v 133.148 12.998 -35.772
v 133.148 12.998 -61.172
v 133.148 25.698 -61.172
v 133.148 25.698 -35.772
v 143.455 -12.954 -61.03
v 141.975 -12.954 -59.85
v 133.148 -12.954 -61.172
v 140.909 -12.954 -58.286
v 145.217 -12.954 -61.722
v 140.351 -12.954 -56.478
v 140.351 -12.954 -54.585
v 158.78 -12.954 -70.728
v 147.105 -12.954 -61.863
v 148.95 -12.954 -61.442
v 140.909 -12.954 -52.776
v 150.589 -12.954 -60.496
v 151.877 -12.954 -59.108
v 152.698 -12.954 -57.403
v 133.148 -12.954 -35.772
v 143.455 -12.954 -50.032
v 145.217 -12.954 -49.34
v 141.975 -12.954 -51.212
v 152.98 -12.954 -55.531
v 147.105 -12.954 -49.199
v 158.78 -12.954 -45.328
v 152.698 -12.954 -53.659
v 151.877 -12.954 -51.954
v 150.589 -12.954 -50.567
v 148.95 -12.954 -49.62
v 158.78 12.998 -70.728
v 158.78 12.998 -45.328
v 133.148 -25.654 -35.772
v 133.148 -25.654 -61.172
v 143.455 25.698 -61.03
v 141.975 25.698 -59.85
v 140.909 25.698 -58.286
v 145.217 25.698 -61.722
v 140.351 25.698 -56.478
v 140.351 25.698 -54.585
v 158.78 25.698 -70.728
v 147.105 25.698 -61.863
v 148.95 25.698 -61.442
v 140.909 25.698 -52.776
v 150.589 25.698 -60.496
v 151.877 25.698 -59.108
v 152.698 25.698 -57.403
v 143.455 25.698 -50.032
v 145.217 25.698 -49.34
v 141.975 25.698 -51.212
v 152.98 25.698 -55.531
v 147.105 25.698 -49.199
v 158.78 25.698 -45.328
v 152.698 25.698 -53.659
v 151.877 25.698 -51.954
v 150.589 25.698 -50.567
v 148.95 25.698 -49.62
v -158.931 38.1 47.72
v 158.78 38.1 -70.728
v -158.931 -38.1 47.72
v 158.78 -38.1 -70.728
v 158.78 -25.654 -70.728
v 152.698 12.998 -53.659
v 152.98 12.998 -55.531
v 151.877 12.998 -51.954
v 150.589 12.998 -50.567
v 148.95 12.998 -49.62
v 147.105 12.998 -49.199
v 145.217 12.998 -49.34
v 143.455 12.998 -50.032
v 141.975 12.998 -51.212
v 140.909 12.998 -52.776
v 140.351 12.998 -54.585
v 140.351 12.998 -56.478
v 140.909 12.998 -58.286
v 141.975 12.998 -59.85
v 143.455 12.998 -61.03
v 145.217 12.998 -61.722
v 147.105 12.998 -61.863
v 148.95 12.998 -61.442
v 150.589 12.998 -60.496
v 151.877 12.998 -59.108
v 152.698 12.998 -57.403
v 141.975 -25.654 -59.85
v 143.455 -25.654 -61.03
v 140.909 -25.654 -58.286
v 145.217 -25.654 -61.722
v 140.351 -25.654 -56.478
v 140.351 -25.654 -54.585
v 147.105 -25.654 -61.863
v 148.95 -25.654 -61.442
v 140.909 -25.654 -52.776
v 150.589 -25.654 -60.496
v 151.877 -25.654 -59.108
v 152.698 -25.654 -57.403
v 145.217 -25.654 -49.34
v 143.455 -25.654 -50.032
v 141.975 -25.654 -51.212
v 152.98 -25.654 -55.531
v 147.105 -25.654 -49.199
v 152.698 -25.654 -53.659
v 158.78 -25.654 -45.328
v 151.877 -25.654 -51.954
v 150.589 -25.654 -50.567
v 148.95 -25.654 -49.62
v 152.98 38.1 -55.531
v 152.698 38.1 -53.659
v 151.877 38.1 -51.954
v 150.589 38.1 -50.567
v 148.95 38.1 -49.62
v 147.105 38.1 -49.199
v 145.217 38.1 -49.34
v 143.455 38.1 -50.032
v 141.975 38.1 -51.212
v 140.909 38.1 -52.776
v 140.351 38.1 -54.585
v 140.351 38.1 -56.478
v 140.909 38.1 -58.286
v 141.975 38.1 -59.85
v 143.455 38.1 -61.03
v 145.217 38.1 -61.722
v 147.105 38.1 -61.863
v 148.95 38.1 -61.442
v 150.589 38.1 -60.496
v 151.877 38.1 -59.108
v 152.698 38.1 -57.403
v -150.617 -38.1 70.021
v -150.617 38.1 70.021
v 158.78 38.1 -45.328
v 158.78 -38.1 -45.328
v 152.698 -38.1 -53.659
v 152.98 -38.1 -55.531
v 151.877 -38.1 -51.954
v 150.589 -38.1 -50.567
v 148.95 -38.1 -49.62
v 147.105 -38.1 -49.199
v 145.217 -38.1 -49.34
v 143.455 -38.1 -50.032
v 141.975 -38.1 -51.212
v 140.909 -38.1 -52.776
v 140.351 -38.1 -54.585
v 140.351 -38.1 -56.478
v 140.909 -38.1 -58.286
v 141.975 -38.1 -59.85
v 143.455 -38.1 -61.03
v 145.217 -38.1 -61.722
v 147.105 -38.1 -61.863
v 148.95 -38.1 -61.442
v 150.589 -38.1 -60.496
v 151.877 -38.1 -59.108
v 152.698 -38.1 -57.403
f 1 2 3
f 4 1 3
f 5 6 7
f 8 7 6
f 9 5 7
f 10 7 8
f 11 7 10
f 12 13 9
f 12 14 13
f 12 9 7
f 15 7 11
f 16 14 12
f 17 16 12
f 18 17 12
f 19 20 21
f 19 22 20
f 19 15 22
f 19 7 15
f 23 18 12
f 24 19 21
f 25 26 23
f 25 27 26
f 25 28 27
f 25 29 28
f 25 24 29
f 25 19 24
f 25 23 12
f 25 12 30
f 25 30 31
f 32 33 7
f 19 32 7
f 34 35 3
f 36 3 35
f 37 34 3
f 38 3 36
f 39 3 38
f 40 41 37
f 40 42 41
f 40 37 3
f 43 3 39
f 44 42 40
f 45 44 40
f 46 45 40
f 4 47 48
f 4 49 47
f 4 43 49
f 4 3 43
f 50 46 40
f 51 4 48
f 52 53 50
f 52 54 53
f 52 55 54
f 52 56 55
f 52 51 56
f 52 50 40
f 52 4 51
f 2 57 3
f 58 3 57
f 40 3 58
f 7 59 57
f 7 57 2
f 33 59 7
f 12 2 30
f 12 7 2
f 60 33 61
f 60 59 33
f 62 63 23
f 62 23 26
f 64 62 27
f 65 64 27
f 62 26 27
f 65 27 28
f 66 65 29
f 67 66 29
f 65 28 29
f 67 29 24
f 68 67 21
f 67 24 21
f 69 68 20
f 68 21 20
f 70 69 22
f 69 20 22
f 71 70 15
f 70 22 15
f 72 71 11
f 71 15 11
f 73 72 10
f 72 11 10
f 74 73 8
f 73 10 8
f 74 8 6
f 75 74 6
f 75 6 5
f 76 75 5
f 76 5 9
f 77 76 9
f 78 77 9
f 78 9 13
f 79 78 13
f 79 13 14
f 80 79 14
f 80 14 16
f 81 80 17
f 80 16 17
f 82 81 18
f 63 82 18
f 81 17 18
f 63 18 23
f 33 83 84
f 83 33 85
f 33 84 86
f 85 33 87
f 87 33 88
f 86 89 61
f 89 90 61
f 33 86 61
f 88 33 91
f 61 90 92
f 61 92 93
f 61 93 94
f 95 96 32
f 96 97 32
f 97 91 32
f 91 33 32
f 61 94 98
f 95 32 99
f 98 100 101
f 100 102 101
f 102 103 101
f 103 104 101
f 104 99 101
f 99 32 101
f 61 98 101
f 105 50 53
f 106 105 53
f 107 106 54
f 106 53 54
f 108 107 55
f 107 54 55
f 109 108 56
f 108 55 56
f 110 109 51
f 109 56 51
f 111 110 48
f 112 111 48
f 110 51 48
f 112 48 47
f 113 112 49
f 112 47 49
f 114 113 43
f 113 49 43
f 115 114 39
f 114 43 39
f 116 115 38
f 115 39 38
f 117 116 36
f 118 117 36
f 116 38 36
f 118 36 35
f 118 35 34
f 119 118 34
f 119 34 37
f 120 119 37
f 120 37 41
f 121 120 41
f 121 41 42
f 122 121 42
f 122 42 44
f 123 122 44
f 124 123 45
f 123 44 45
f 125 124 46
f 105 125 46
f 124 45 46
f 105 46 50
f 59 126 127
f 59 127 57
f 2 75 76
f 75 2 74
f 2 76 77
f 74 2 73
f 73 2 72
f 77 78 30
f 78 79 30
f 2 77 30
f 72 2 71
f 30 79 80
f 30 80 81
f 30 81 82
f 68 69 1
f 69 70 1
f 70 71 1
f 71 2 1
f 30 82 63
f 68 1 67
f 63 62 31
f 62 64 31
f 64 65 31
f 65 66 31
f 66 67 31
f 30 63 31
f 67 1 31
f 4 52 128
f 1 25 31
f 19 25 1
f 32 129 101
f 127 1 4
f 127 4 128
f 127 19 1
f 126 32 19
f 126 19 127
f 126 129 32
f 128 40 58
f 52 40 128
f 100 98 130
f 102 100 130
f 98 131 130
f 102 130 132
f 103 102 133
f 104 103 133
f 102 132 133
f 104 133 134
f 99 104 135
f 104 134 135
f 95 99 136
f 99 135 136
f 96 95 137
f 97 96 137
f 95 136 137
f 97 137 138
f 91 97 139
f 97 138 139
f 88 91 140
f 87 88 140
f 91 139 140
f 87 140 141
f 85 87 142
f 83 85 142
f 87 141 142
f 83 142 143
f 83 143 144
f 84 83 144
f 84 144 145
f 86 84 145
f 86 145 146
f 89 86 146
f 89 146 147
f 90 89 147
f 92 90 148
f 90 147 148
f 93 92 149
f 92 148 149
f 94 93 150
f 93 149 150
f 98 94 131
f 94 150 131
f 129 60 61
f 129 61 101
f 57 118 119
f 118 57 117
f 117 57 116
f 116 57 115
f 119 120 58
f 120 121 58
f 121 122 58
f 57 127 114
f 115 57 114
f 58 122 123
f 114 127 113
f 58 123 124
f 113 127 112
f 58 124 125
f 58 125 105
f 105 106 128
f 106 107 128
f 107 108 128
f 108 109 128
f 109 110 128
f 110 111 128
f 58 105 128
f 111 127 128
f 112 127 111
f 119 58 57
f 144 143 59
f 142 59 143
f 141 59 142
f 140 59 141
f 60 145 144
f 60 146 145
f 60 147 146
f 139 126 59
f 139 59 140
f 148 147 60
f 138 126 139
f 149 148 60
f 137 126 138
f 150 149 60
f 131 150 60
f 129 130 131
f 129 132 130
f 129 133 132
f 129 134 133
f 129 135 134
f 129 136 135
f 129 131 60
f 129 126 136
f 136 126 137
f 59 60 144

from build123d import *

# Parameters (mm, degrees)
F1_DEPTH = 38.1
F2_W     = 30.48
F2_H     = 12.699997
F3_DEPTH = 72.898
F4_R     = 6.35
F5_DEPTH = 38.1


with BuildPart() as f1:
    # F0 (on Front) → F1 (new body, symmetric)
    with BuildSketch(Plane.XZ):
        Polygon((190.276301, -36.691978), (-119.121099, 78.656576), (-127.435068, 56.356163), (190.276301, -62.091978), align=None)
    extrude(amount=F1_DEPTH, both=True)

    # F2 (on Top) → F3 (cut)
    with BuildSketch(Plane.XY):
        with Locations((179.884099, 19.347873)):
            Rectangle(F2_W, F2_H)
        with Locations((179.884092, -19.304001)):
            Rectangle(F2_W, F2_H)
    extrude(amount=-F3_DEPTH, mode=Mode.SUBTRACT)

    # F4 (on Front) → F5 (cut, symmetric)
    with BuildSketch(Plane.XZ):
        with Locations((178.126182, -46.895169)):
            Circle(F4_R)
    extrude(amount=F5_DEPTH, both=True, mode=Mode.SUBTRACT)


with BuildPart() as f1_1:
    # F6: moved
    add(f1.part.moved(Location((-31.496, 0, -8.636))))


solid = f1_1.part
